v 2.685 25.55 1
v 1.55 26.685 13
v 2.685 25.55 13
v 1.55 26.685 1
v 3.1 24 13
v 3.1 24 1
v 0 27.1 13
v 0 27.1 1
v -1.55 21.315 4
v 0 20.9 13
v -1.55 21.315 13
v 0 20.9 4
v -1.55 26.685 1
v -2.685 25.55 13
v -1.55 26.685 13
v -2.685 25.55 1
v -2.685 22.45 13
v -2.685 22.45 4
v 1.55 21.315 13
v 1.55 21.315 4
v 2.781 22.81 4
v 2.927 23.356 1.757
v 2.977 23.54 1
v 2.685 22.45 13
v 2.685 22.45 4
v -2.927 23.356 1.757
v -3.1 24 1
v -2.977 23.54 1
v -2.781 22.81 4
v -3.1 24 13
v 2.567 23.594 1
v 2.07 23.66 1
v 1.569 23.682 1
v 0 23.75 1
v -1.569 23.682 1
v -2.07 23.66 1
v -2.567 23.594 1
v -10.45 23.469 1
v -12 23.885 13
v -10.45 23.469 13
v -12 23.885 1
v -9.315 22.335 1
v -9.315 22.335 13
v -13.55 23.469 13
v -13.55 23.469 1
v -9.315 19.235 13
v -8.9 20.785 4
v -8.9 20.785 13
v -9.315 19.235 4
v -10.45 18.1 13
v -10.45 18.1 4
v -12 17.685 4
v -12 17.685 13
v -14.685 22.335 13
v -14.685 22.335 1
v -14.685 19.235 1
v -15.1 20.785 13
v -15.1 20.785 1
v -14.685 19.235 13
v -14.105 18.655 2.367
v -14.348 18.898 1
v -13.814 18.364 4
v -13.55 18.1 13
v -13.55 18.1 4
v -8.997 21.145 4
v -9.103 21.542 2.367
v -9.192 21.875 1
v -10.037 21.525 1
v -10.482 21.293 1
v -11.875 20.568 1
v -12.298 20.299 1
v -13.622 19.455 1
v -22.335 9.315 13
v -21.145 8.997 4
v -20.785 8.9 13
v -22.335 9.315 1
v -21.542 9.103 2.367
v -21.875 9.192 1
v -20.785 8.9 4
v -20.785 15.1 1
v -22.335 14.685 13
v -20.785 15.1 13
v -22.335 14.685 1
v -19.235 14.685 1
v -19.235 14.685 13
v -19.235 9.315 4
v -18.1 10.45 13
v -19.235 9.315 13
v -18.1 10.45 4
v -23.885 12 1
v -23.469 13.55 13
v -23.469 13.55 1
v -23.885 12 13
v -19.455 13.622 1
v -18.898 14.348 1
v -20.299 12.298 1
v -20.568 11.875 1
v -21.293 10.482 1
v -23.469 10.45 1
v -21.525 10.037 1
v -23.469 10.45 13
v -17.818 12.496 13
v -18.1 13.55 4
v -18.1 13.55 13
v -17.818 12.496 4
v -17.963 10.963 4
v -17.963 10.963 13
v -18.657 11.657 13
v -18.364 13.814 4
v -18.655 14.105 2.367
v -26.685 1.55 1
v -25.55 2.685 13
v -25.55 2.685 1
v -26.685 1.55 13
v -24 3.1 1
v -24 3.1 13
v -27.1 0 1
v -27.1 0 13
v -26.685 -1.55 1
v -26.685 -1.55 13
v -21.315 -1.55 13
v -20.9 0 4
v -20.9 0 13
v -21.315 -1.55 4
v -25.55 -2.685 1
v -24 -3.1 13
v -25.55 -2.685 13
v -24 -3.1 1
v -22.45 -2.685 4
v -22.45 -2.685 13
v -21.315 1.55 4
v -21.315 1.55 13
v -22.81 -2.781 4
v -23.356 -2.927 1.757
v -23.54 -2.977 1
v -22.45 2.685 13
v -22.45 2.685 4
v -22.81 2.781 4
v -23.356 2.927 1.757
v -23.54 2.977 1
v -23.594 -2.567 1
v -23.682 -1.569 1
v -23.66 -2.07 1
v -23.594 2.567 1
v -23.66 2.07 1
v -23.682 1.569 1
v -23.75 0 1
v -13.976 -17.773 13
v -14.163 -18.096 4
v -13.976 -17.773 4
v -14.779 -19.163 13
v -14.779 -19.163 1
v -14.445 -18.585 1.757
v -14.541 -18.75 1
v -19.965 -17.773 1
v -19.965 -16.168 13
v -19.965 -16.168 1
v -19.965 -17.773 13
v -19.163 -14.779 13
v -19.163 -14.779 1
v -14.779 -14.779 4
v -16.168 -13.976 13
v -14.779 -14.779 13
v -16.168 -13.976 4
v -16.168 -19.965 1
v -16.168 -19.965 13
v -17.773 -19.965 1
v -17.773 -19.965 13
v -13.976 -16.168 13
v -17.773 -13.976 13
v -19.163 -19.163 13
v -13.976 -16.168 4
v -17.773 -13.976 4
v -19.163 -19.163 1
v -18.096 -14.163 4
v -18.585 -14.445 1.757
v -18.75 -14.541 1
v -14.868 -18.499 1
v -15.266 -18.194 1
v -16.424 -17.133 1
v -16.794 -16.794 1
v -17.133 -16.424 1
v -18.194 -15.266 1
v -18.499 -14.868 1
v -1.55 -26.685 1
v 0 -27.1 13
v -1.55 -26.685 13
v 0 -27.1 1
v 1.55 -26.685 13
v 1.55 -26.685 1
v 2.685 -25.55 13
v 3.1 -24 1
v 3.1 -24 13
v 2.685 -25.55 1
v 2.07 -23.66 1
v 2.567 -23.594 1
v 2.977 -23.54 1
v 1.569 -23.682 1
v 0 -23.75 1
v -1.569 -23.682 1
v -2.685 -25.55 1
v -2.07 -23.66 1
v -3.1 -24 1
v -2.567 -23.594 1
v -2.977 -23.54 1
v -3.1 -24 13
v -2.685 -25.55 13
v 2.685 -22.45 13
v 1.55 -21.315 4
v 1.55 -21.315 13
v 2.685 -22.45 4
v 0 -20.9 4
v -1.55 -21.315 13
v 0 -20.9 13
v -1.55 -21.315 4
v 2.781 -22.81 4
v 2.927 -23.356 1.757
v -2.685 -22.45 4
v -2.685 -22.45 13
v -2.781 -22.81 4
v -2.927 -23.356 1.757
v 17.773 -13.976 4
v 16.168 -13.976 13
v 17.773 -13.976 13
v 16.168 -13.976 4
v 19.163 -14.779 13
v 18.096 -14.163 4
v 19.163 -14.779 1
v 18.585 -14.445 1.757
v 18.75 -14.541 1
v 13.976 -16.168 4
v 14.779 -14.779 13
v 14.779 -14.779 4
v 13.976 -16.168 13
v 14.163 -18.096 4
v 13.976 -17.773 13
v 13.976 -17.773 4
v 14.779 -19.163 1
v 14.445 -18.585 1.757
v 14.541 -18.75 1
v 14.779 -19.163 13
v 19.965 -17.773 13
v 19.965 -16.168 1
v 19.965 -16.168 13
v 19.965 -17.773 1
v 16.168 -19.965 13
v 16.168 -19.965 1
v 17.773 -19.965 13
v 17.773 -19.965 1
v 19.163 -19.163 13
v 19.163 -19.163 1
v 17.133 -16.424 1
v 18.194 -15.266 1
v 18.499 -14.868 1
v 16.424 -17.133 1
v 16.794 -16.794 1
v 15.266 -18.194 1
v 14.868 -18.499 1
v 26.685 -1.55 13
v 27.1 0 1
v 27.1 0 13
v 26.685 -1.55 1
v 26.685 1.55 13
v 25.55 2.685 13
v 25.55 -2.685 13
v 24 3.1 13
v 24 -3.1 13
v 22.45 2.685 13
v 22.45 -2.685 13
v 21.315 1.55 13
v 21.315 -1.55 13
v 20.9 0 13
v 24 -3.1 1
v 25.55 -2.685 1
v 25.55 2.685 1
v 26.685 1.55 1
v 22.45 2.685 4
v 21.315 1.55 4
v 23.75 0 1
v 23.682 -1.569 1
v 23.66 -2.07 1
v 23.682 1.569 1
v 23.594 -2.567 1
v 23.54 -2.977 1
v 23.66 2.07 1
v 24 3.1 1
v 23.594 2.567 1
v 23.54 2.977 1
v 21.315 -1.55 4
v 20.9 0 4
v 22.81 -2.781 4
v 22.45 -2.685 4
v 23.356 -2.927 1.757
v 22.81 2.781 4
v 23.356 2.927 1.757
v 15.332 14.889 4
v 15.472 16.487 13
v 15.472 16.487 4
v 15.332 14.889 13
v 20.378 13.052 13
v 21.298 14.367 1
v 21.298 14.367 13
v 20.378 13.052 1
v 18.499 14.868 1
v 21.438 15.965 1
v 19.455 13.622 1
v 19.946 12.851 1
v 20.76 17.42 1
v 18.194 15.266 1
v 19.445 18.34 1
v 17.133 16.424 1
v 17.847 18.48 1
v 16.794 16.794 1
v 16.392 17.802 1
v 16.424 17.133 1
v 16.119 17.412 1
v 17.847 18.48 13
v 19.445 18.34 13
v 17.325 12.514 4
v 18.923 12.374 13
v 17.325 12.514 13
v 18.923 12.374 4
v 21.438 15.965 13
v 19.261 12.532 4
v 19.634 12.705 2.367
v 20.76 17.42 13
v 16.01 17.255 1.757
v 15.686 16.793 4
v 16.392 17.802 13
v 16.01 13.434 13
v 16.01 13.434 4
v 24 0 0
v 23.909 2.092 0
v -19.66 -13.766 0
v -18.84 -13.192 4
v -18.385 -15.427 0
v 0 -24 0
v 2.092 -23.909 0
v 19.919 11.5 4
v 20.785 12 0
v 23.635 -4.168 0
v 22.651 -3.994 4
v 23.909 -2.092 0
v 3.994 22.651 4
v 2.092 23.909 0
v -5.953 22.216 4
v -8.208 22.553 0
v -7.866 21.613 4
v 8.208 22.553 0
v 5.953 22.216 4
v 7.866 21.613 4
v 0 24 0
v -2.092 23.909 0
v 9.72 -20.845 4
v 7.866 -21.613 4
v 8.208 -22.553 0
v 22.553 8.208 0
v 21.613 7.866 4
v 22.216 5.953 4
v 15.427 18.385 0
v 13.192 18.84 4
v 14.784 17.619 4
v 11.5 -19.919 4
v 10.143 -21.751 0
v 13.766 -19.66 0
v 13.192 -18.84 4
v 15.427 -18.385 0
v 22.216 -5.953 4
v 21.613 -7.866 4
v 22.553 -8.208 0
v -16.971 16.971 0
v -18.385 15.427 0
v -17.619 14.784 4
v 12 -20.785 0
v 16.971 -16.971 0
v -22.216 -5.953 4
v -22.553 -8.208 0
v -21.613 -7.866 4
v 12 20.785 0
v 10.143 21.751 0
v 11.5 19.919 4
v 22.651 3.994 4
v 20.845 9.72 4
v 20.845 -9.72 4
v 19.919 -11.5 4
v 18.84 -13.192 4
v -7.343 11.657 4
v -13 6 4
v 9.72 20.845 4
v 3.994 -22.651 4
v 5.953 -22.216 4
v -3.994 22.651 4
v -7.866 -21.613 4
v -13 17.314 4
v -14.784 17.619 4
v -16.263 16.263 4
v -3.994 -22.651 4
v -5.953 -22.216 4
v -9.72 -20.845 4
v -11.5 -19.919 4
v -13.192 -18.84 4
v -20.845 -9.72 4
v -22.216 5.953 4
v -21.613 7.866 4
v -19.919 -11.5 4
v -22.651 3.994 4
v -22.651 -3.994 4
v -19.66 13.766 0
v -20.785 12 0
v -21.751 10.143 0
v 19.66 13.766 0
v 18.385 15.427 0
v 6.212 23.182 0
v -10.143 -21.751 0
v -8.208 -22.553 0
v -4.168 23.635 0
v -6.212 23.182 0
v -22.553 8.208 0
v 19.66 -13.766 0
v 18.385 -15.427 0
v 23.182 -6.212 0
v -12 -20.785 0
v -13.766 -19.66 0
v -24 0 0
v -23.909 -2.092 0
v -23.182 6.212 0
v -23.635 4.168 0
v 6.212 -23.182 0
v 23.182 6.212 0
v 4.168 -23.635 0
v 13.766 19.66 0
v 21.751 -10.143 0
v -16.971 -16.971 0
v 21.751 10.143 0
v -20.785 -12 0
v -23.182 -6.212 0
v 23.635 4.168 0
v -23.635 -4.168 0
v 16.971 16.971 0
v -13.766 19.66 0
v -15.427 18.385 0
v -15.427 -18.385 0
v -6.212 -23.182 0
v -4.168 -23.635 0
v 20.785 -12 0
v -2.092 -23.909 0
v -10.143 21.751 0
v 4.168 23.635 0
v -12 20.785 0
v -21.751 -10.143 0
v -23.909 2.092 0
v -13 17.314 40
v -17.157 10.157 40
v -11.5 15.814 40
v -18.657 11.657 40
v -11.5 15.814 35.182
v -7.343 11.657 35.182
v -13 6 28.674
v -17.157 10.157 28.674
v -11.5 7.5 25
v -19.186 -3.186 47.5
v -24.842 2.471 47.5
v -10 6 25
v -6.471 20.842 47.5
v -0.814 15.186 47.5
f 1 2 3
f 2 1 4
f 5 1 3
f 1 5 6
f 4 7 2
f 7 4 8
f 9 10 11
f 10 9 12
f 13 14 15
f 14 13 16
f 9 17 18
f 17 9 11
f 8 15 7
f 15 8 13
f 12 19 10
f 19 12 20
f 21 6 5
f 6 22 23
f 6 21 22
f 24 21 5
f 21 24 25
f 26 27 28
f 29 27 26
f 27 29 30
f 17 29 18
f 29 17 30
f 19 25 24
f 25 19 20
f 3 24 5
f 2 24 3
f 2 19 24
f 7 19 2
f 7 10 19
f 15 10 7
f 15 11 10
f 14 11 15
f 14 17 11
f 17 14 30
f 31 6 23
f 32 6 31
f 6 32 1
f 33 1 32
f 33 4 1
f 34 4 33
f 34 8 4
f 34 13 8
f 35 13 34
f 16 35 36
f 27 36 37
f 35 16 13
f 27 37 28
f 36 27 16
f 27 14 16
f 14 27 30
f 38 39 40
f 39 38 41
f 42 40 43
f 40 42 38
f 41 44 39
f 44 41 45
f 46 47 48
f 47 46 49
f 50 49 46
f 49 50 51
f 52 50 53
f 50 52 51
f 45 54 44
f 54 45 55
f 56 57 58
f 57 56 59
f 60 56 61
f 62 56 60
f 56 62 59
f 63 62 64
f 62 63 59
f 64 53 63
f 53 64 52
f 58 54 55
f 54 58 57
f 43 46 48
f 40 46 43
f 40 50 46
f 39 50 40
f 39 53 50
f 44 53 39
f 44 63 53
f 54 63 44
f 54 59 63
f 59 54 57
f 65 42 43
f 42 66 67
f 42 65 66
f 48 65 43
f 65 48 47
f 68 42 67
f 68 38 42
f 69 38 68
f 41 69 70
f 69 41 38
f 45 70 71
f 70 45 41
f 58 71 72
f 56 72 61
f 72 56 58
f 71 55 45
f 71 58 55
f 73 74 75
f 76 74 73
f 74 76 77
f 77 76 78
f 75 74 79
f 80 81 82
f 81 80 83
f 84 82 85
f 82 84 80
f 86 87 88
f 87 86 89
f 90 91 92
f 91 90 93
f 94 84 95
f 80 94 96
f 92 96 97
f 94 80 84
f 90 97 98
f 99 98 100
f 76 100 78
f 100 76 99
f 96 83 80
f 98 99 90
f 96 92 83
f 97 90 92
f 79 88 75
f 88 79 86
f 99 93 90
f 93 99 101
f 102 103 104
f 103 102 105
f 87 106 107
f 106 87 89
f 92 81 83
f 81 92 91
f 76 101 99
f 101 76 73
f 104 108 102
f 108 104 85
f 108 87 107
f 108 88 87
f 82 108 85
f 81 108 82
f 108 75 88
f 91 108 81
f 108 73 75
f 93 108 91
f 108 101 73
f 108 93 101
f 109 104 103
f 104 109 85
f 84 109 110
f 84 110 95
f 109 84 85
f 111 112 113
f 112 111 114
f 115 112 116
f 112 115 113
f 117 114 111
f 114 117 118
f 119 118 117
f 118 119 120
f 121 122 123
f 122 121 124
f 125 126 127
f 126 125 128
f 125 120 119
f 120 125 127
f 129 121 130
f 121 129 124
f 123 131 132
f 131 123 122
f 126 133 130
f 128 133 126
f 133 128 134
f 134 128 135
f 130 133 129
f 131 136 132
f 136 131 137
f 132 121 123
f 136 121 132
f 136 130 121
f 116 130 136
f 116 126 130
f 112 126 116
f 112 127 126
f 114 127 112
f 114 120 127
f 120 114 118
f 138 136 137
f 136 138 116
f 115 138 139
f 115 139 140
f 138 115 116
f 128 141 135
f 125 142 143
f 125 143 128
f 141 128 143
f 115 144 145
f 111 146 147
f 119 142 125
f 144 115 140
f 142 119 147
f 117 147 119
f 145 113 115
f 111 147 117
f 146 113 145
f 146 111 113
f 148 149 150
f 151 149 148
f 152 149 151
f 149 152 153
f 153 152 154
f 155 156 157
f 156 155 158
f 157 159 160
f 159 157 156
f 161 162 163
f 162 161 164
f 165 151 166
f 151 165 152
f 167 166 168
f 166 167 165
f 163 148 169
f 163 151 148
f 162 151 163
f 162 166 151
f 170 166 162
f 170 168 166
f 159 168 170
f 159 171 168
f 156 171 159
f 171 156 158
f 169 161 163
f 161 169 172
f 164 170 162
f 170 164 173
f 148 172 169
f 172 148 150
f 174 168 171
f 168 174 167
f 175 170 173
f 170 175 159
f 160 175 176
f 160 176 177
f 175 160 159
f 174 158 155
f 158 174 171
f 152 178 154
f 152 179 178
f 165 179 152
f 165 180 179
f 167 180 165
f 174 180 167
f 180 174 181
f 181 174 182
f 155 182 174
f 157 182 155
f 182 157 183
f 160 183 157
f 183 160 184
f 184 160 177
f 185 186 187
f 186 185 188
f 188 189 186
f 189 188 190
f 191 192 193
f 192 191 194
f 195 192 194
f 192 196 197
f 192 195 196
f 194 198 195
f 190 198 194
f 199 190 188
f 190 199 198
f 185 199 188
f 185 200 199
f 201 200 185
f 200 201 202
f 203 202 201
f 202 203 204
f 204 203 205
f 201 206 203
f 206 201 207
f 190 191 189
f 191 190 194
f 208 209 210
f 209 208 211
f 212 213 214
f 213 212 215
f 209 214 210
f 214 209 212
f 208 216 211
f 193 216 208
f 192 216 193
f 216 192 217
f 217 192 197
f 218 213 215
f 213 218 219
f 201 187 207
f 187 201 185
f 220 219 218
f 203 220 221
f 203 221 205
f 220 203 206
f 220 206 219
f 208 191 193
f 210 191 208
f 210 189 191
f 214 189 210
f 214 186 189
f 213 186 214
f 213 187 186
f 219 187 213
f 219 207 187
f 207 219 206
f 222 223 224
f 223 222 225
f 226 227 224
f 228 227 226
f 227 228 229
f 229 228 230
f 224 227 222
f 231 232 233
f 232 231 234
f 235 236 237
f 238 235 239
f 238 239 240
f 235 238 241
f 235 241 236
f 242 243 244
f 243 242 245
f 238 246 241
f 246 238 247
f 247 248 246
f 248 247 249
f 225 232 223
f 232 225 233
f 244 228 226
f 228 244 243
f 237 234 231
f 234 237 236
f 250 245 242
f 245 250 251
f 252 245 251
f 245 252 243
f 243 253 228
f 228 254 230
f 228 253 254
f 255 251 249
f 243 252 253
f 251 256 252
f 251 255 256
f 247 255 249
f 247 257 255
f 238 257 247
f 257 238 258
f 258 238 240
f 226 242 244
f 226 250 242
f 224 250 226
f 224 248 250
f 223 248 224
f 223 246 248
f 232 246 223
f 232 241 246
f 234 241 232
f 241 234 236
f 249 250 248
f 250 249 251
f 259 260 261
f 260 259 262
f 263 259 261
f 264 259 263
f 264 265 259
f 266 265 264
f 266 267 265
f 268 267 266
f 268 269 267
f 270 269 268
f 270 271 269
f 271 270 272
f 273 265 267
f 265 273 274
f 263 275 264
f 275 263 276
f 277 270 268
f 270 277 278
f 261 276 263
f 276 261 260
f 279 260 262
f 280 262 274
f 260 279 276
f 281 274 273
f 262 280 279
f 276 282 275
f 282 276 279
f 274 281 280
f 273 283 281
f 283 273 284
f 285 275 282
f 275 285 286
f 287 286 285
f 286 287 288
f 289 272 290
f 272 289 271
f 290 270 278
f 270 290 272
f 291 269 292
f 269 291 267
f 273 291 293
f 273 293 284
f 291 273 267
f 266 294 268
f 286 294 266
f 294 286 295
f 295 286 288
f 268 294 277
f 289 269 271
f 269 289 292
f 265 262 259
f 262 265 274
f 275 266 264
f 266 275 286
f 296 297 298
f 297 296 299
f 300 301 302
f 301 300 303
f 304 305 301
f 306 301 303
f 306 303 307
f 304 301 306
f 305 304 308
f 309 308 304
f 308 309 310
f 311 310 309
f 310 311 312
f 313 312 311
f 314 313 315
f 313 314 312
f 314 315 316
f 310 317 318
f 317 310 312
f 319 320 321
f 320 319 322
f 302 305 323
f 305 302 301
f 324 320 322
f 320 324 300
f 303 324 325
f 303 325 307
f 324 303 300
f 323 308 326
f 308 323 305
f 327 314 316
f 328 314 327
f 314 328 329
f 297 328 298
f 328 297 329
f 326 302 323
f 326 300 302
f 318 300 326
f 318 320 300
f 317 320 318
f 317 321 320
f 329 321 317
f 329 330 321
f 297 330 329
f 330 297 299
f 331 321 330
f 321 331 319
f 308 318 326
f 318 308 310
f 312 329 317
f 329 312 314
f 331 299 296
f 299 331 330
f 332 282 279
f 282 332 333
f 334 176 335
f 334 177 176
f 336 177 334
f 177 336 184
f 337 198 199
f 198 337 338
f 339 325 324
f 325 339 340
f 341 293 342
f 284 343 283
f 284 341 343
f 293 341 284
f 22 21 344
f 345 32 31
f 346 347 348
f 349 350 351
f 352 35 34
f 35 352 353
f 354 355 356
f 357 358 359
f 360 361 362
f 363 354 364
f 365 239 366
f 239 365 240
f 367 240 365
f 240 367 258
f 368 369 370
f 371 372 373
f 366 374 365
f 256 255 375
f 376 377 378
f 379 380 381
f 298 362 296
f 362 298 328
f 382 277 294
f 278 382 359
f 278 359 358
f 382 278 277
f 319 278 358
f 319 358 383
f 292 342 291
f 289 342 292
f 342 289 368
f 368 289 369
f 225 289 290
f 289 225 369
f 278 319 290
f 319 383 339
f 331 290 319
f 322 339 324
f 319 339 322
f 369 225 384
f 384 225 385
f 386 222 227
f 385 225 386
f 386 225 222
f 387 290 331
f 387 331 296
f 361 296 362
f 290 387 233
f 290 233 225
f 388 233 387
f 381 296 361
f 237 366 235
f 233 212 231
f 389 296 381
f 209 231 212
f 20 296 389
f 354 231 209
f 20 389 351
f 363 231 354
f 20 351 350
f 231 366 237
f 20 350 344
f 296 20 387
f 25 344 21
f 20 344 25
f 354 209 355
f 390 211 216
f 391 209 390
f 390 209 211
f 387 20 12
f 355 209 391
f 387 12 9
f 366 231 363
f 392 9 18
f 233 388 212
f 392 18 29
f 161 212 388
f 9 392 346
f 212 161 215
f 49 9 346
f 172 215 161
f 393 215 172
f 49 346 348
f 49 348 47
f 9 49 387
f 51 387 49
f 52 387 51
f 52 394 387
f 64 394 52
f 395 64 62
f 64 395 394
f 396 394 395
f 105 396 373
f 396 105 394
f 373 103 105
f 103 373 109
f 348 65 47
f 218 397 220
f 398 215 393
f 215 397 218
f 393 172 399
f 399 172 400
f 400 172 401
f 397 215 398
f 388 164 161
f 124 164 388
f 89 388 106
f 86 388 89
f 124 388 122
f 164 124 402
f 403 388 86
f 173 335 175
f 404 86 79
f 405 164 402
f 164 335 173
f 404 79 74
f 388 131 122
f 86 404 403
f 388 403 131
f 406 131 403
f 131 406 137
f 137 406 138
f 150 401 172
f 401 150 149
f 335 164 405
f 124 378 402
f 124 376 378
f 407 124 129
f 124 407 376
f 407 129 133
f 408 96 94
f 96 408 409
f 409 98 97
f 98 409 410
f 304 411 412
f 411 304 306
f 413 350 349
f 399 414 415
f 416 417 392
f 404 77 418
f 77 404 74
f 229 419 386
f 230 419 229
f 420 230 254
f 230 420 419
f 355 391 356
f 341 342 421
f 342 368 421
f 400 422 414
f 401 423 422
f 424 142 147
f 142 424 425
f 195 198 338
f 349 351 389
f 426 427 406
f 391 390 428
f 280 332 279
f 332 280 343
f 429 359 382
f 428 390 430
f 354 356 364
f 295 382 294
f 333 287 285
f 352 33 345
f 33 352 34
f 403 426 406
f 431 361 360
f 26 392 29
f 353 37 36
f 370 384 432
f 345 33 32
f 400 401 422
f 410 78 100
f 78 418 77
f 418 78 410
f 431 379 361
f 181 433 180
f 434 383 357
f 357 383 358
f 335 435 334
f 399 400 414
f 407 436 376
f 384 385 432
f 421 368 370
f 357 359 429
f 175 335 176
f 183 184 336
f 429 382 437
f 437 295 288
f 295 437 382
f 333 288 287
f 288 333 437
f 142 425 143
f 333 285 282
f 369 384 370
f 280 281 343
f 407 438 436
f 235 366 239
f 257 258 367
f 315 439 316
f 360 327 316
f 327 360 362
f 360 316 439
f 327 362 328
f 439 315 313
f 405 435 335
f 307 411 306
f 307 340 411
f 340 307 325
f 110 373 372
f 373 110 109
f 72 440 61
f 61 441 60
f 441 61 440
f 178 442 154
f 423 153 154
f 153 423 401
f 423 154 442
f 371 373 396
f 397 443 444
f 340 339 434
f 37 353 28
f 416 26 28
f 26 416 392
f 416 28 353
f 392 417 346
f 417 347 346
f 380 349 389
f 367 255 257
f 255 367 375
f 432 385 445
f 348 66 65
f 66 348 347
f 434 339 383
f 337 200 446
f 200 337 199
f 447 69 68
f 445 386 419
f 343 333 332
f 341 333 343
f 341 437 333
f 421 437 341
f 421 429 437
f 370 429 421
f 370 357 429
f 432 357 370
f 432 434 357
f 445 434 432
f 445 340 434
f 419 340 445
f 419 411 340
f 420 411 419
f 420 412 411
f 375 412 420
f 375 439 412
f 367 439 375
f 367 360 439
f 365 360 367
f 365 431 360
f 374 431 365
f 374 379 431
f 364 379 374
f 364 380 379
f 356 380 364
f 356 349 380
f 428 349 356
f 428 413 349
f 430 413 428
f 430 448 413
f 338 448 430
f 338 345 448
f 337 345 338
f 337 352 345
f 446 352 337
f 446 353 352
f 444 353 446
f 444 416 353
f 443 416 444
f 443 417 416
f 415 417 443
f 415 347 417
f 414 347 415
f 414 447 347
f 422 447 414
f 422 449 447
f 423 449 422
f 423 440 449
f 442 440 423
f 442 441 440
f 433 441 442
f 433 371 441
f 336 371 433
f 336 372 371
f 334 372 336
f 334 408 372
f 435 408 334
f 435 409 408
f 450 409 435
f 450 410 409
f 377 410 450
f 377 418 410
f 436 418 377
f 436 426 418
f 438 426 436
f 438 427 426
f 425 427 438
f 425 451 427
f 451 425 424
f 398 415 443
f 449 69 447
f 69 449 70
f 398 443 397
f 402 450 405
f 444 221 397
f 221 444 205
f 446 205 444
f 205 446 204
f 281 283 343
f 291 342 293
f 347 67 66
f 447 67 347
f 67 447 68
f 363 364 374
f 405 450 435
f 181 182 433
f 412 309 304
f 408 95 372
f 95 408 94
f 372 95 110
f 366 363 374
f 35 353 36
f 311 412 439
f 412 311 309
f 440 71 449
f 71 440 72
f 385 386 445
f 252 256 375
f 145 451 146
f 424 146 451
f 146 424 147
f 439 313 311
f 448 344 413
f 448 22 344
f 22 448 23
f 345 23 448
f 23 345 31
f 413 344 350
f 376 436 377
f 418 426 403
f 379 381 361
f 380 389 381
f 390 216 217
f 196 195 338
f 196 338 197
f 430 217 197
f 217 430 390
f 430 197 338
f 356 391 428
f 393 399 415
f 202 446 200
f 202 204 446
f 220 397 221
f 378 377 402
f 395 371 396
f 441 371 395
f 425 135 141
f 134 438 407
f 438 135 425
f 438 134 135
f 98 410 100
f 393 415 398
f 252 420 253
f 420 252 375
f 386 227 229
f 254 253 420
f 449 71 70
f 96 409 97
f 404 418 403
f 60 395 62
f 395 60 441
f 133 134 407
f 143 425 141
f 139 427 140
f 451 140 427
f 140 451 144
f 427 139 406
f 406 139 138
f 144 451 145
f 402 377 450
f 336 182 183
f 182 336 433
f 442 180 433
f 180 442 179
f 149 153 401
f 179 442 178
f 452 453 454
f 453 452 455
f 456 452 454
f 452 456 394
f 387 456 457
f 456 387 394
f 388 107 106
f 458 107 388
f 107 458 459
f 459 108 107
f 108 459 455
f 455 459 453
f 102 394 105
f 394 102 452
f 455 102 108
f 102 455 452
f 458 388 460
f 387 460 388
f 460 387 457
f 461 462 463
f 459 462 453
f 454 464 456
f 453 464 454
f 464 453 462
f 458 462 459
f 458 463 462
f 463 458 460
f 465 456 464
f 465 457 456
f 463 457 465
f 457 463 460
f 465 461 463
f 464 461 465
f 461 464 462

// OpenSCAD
// ToolDown will sink down into the pocket, but does not provide a hanger for automatic tool changes
// ToolUp will come with a changeable hook
// The mounting flange is 3mm thick, 25mm wide
// the hole is then 
flange_radius = 25;     // Radius of bearing flange (5mm)
hole_radius = 20;    // Radius of bearing (below flange)
height = 18;            // height of overall effector
magnet_radius = 3;
magnet_height = 12; // actually bought 6mmx10mm magnets
magnet_count = 8;
extra_radius = 0.1;


module ToolDown()
{
        // outer flange
        translate([0, 0, 0])
        cylinder(r1=flange_radius-1, r2=flange_radius-2, h=4, $fn=72);
        // main cylinder
        translate([0, 0, 0])
        cylinder(r1=hole_radius-1, r2=hole_radius-3, h=height, $fn=72);
        // magnet pockets
        for (a = [0, 30, 60, 90, 135, 180, 225, 270, 310]) rotate([0, 0, a])
        {
            translate([0, hole_radius+magnet_radius+1, 1])
            #cylinder(r=magnet_radius+extra_radius, h=magnet_height, center=false, $fn=12);
        }
}

module ToolUp()
{
        // outer flange
        translate([0, 0, 0])
        cylinder(r1=flange_radius-1, r2=flange_radius-2, h=4, $fn=72);
        // Arm to go up
        translate([-13, 6, 0]) rotate([0,0,45])
        #cube([8,8,40], center=false);
        translate([-10,6,40]) rotate([0,90,135])
        cylinder(r=15, h=8, $fn=3);
        // magnet pockets
        for (a = [0, 30, 60, 90, 135, 180, 225, 270, 310]) rotate([0, 0, a])
        {
            translate([0, hole_radius+magnet_radius+1, 1])
            #cylinder(r=magnet_radius+extra_radius, h=magnet_height, center=false, $fn=12);
        }
}
ToolUp();
